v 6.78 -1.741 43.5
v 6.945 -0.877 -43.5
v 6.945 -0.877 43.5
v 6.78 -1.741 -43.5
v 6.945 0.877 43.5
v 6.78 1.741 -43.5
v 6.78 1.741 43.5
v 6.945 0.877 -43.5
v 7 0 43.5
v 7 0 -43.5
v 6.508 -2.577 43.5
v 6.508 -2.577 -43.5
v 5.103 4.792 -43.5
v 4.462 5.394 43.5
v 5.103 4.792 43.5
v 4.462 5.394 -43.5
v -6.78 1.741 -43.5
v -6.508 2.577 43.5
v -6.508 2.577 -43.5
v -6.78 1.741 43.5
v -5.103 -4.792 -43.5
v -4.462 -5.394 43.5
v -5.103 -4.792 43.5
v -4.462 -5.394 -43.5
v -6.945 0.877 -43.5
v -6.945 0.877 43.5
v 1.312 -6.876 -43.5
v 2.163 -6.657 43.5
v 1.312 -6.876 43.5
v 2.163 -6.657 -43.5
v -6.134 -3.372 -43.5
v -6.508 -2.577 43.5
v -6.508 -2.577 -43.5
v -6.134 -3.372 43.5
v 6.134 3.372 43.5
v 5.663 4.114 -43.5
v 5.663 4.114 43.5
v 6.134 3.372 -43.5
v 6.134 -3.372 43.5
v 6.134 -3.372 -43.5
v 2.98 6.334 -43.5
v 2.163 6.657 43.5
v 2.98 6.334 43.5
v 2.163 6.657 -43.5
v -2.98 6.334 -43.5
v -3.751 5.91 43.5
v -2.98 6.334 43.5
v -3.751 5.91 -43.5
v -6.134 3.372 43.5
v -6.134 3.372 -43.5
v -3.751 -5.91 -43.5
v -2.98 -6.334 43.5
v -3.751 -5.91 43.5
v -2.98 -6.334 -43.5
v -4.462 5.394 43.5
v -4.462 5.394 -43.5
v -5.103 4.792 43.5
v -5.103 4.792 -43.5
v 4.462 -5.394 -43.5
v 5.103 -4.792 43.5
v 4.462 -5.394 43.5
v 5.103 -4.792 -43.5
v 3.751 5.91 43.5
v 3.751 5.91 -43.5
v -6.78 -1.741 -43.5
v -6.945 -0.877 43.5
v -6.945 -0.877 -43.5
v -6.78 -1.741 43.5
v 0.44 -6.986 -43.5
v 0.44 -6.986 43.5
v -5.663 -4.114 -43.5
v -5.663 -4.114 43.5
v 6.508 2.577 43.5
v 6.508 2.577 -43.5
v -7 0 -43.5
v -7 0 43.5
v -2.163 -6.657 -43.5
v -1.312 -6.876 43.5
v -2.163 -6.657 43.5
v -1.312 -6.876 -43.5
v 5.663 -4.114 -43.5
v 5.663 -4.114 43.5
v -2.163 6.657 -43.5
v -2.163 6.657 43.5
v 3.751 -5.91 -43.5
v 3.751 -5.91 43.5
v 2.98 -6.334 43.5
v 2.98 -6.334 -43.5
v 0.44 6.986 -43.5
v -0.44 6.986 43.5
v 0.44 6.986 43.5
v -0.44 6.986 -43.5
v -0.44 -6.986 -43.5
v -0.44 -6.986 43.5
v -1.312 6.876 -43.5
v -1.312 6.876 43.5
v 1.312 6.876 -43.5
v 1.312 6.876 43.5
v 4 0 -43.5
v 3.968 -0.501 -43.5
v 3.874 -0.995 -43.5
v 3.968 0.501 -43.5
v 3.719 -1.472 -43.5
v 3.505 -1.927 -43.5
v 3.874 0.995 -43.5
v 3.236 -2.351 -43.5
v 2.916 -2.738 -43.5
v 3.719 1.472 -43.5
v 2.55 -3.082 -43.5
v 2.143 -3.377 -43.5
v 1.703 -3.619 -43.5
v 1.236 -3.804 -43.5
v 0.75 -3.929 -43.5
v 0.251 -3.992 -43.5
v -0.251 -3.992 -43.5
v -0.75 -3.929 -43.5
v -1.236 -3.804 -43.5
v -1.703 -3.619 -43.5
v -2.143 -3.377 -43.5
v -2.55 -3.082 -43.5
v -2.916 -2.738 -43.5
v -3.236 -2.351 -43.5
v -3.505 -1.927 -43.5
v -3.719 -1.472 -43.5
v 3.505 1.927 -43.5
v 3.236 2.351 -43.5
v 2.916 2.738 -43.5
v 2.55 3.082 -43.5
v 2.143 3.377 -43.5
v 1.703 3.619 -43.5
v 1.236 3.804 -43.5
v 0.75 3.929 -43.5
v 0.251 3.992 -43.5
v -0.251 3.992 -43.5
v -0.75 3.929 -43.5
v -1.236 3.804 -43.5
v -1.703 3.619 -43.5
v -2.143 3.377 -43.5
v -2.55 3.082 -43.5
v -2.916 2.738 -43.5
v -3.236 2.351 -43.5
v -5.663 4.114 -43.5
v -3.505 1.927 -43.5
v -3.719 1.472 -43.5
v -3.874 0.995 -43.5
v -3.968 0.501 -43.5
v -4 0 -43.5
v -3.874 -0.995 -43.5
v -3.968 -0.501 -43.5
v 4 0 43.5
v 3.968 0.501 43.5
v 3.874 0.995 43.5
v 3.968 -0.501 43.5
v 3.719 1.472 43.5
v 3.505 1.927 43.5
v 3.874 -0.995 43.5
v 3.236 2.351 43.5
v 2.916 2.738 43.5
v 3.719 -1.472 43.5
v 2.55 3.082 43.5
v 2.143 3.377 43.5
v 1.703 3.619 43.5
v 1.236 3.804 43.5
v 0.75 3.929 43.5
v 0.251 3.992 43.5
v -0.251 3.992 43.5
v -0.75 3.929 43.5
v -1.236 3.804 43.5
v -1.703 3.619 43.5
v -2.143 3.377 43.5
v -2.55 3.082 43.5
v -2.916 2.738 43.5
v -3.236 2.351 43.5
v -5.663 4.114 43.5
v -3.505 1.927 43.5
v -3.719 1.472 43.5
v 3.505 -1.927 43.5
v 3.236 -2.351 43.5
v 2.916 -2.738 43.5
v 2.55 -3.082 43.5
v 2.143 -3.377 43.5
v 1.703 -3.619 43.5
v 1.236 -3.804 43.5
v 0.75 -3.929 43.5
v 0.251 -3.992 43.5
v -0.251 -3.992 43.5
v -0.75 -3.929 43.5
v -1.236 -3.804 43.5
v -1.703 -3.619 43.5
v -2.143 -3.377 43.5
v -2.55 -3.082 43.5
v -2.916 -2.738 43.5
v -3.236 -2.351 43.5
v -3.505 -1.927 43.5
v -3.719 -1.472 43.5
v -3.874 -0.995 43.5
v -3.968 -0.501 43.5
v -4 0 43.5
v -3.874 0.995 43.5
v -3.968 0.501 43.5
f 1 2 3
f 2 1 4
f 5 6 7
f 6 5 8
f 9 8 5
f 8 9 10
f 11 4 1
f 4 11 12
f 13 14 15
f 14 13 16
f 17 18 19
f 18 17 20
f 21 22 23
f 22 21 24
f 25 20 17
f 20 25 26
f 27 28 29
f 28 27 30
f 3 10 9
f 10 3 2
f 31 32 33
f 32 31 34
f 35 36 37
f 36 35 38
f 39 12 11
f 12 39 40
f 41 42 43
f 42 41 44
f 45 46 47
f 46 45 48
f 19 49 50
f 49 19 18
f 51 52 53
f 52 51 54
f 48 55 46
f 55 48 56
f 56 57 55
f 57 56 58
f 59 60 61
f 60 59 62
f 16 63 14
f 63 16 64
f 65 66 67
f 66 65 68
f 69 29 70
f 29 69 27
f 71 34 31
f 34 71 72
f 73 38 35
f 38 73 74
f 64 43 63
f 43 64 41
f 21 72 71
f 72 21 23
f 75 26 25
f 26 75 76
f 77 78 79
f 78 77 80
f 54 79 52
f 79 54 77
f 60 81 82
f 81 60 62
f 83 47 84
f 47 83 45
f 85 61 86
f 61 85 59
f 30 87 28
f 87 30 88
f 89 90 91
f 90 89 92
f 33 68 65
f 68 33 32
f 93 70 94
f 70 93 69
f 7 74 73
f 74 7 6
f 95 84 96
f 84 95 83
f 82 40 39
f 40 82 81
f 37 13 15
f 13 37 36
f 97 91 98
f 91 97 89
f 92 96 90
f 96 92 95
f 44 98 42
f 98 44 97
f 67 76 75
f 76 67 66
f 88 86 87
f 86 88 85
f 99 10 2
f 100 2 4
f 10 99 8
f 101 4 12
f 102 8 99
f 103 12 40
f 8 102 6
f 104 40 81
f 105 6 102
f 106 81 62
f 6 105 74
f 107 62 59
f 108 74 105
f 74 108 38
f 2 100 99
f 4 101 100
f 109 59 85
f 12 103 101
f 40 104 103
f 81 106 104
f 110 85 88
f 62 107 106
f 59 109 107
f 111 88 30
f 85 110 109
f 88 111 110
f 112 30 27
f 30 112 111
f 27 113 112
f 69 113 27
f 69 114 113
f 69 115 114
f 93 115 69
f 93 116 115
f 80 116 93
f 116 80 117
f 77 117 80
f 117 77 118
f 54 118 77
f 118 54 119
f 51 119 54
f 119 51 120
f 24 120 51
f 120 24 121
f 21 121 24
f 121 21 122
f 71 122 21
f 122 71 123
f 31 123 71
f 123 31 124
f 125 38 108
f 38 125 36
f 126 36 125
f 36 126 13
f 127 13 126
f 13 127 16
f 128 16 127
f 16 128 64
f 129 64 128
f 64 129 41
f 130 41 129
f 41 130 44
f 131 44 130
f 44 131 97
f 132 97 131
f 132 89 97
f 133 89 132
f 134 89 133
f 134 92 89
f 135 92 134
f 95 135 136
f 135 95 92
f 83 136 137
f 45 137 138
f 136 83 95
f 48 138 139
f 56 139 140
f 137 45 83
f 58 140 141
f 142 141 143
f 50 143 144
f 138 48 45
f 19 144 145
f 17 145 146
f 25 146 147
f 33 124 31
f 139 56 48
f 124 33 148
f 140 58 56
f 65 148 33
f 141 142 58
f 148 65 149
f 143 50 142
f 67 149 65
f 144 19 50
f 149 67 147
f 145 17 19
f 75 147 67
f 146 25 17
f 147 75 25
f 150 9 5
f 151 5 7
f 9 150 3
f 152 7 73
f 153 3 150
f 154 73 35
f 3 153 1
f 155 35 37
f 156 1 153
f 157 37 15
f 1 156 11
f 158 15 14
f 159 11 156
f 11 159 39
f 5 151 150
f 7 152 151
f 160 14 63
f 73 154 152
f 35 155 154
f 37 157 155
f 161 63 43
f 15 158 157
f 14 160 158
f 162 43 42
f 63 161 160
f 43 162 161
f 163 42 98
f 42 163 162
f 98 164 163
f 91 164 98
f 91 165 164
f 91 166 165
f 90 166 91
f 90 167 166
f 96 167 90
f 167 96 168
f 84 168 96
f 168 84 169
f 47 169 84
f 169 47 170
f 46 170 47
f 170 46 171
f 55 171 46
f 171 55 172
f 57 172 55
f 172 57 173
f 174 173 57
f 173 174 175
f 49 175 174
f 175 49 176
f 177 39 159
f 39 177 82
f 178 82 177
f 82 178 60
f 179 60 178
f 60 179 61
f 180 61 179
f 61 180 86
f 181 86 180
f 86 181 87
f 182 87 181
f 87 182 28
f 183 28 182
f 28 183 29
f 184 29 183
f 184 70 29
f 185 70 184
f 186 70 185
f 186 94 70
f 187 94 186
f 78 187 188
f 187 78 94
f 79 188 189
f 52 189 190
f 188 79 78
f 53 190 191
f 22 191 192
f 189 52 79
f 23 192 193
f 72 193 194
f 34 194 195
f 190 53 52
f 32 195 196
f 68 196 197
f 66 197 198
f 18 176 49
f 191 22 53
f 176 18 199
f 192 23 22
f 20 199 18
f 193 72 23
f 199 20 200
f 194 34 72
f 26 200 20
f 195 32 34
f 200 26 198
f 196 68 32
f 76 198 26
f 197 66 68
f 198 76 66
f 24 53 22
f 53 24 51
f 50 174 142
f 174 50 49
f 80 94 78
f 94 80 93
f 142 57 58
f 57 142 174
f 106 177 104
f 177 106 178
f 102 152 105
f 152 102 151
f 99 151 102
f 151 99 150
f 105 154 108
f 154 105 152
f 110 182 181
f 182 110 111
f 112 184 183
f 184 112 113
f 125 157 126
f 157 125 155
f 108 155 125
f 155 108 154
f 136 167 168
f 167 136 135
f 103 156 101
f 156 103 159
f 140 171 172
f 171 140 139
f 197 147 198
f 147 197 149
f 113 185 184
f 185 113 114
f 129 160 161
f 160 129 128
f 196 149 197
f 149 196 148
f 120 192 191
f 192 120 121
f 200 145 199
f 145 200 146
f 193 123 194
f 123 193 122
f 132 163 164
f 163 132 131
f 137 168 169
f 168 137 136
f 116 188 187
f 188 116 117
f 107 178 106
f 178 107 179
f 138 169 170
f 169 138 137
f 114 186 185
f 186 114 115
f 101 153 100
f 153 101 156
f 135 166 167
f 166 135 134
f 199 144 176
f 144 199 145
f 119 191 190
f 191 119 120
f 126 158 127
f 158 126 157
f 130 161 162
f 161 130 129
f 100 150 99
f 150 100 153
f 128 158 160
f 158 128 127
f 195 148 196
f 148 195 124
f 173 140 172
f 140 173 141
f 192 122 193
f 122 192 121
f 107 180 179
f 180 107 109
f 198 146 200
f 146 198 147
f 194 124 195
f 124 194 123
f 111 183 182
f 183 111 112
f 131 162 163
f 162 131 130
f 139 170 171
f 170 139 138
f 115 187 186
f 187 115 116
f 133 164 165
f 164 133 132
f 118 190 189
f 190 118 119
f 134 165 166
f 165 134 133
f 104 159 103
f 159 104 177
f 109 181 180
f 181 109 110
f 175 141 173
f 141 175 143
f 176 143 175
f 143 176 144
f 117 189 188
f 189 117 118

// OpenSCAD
$fn = 50;


difference() {
	union() {
		translate(v = [0, 0, -43.5000000000]) {
			cylinder(h = 87, r = 7.0000000000);
		}
	}
	union() {
		translate(v = [0, 0, -100.0000000000]) {
			cylinder(h = 200, r = 4.0000000000);
		}
	}
}
